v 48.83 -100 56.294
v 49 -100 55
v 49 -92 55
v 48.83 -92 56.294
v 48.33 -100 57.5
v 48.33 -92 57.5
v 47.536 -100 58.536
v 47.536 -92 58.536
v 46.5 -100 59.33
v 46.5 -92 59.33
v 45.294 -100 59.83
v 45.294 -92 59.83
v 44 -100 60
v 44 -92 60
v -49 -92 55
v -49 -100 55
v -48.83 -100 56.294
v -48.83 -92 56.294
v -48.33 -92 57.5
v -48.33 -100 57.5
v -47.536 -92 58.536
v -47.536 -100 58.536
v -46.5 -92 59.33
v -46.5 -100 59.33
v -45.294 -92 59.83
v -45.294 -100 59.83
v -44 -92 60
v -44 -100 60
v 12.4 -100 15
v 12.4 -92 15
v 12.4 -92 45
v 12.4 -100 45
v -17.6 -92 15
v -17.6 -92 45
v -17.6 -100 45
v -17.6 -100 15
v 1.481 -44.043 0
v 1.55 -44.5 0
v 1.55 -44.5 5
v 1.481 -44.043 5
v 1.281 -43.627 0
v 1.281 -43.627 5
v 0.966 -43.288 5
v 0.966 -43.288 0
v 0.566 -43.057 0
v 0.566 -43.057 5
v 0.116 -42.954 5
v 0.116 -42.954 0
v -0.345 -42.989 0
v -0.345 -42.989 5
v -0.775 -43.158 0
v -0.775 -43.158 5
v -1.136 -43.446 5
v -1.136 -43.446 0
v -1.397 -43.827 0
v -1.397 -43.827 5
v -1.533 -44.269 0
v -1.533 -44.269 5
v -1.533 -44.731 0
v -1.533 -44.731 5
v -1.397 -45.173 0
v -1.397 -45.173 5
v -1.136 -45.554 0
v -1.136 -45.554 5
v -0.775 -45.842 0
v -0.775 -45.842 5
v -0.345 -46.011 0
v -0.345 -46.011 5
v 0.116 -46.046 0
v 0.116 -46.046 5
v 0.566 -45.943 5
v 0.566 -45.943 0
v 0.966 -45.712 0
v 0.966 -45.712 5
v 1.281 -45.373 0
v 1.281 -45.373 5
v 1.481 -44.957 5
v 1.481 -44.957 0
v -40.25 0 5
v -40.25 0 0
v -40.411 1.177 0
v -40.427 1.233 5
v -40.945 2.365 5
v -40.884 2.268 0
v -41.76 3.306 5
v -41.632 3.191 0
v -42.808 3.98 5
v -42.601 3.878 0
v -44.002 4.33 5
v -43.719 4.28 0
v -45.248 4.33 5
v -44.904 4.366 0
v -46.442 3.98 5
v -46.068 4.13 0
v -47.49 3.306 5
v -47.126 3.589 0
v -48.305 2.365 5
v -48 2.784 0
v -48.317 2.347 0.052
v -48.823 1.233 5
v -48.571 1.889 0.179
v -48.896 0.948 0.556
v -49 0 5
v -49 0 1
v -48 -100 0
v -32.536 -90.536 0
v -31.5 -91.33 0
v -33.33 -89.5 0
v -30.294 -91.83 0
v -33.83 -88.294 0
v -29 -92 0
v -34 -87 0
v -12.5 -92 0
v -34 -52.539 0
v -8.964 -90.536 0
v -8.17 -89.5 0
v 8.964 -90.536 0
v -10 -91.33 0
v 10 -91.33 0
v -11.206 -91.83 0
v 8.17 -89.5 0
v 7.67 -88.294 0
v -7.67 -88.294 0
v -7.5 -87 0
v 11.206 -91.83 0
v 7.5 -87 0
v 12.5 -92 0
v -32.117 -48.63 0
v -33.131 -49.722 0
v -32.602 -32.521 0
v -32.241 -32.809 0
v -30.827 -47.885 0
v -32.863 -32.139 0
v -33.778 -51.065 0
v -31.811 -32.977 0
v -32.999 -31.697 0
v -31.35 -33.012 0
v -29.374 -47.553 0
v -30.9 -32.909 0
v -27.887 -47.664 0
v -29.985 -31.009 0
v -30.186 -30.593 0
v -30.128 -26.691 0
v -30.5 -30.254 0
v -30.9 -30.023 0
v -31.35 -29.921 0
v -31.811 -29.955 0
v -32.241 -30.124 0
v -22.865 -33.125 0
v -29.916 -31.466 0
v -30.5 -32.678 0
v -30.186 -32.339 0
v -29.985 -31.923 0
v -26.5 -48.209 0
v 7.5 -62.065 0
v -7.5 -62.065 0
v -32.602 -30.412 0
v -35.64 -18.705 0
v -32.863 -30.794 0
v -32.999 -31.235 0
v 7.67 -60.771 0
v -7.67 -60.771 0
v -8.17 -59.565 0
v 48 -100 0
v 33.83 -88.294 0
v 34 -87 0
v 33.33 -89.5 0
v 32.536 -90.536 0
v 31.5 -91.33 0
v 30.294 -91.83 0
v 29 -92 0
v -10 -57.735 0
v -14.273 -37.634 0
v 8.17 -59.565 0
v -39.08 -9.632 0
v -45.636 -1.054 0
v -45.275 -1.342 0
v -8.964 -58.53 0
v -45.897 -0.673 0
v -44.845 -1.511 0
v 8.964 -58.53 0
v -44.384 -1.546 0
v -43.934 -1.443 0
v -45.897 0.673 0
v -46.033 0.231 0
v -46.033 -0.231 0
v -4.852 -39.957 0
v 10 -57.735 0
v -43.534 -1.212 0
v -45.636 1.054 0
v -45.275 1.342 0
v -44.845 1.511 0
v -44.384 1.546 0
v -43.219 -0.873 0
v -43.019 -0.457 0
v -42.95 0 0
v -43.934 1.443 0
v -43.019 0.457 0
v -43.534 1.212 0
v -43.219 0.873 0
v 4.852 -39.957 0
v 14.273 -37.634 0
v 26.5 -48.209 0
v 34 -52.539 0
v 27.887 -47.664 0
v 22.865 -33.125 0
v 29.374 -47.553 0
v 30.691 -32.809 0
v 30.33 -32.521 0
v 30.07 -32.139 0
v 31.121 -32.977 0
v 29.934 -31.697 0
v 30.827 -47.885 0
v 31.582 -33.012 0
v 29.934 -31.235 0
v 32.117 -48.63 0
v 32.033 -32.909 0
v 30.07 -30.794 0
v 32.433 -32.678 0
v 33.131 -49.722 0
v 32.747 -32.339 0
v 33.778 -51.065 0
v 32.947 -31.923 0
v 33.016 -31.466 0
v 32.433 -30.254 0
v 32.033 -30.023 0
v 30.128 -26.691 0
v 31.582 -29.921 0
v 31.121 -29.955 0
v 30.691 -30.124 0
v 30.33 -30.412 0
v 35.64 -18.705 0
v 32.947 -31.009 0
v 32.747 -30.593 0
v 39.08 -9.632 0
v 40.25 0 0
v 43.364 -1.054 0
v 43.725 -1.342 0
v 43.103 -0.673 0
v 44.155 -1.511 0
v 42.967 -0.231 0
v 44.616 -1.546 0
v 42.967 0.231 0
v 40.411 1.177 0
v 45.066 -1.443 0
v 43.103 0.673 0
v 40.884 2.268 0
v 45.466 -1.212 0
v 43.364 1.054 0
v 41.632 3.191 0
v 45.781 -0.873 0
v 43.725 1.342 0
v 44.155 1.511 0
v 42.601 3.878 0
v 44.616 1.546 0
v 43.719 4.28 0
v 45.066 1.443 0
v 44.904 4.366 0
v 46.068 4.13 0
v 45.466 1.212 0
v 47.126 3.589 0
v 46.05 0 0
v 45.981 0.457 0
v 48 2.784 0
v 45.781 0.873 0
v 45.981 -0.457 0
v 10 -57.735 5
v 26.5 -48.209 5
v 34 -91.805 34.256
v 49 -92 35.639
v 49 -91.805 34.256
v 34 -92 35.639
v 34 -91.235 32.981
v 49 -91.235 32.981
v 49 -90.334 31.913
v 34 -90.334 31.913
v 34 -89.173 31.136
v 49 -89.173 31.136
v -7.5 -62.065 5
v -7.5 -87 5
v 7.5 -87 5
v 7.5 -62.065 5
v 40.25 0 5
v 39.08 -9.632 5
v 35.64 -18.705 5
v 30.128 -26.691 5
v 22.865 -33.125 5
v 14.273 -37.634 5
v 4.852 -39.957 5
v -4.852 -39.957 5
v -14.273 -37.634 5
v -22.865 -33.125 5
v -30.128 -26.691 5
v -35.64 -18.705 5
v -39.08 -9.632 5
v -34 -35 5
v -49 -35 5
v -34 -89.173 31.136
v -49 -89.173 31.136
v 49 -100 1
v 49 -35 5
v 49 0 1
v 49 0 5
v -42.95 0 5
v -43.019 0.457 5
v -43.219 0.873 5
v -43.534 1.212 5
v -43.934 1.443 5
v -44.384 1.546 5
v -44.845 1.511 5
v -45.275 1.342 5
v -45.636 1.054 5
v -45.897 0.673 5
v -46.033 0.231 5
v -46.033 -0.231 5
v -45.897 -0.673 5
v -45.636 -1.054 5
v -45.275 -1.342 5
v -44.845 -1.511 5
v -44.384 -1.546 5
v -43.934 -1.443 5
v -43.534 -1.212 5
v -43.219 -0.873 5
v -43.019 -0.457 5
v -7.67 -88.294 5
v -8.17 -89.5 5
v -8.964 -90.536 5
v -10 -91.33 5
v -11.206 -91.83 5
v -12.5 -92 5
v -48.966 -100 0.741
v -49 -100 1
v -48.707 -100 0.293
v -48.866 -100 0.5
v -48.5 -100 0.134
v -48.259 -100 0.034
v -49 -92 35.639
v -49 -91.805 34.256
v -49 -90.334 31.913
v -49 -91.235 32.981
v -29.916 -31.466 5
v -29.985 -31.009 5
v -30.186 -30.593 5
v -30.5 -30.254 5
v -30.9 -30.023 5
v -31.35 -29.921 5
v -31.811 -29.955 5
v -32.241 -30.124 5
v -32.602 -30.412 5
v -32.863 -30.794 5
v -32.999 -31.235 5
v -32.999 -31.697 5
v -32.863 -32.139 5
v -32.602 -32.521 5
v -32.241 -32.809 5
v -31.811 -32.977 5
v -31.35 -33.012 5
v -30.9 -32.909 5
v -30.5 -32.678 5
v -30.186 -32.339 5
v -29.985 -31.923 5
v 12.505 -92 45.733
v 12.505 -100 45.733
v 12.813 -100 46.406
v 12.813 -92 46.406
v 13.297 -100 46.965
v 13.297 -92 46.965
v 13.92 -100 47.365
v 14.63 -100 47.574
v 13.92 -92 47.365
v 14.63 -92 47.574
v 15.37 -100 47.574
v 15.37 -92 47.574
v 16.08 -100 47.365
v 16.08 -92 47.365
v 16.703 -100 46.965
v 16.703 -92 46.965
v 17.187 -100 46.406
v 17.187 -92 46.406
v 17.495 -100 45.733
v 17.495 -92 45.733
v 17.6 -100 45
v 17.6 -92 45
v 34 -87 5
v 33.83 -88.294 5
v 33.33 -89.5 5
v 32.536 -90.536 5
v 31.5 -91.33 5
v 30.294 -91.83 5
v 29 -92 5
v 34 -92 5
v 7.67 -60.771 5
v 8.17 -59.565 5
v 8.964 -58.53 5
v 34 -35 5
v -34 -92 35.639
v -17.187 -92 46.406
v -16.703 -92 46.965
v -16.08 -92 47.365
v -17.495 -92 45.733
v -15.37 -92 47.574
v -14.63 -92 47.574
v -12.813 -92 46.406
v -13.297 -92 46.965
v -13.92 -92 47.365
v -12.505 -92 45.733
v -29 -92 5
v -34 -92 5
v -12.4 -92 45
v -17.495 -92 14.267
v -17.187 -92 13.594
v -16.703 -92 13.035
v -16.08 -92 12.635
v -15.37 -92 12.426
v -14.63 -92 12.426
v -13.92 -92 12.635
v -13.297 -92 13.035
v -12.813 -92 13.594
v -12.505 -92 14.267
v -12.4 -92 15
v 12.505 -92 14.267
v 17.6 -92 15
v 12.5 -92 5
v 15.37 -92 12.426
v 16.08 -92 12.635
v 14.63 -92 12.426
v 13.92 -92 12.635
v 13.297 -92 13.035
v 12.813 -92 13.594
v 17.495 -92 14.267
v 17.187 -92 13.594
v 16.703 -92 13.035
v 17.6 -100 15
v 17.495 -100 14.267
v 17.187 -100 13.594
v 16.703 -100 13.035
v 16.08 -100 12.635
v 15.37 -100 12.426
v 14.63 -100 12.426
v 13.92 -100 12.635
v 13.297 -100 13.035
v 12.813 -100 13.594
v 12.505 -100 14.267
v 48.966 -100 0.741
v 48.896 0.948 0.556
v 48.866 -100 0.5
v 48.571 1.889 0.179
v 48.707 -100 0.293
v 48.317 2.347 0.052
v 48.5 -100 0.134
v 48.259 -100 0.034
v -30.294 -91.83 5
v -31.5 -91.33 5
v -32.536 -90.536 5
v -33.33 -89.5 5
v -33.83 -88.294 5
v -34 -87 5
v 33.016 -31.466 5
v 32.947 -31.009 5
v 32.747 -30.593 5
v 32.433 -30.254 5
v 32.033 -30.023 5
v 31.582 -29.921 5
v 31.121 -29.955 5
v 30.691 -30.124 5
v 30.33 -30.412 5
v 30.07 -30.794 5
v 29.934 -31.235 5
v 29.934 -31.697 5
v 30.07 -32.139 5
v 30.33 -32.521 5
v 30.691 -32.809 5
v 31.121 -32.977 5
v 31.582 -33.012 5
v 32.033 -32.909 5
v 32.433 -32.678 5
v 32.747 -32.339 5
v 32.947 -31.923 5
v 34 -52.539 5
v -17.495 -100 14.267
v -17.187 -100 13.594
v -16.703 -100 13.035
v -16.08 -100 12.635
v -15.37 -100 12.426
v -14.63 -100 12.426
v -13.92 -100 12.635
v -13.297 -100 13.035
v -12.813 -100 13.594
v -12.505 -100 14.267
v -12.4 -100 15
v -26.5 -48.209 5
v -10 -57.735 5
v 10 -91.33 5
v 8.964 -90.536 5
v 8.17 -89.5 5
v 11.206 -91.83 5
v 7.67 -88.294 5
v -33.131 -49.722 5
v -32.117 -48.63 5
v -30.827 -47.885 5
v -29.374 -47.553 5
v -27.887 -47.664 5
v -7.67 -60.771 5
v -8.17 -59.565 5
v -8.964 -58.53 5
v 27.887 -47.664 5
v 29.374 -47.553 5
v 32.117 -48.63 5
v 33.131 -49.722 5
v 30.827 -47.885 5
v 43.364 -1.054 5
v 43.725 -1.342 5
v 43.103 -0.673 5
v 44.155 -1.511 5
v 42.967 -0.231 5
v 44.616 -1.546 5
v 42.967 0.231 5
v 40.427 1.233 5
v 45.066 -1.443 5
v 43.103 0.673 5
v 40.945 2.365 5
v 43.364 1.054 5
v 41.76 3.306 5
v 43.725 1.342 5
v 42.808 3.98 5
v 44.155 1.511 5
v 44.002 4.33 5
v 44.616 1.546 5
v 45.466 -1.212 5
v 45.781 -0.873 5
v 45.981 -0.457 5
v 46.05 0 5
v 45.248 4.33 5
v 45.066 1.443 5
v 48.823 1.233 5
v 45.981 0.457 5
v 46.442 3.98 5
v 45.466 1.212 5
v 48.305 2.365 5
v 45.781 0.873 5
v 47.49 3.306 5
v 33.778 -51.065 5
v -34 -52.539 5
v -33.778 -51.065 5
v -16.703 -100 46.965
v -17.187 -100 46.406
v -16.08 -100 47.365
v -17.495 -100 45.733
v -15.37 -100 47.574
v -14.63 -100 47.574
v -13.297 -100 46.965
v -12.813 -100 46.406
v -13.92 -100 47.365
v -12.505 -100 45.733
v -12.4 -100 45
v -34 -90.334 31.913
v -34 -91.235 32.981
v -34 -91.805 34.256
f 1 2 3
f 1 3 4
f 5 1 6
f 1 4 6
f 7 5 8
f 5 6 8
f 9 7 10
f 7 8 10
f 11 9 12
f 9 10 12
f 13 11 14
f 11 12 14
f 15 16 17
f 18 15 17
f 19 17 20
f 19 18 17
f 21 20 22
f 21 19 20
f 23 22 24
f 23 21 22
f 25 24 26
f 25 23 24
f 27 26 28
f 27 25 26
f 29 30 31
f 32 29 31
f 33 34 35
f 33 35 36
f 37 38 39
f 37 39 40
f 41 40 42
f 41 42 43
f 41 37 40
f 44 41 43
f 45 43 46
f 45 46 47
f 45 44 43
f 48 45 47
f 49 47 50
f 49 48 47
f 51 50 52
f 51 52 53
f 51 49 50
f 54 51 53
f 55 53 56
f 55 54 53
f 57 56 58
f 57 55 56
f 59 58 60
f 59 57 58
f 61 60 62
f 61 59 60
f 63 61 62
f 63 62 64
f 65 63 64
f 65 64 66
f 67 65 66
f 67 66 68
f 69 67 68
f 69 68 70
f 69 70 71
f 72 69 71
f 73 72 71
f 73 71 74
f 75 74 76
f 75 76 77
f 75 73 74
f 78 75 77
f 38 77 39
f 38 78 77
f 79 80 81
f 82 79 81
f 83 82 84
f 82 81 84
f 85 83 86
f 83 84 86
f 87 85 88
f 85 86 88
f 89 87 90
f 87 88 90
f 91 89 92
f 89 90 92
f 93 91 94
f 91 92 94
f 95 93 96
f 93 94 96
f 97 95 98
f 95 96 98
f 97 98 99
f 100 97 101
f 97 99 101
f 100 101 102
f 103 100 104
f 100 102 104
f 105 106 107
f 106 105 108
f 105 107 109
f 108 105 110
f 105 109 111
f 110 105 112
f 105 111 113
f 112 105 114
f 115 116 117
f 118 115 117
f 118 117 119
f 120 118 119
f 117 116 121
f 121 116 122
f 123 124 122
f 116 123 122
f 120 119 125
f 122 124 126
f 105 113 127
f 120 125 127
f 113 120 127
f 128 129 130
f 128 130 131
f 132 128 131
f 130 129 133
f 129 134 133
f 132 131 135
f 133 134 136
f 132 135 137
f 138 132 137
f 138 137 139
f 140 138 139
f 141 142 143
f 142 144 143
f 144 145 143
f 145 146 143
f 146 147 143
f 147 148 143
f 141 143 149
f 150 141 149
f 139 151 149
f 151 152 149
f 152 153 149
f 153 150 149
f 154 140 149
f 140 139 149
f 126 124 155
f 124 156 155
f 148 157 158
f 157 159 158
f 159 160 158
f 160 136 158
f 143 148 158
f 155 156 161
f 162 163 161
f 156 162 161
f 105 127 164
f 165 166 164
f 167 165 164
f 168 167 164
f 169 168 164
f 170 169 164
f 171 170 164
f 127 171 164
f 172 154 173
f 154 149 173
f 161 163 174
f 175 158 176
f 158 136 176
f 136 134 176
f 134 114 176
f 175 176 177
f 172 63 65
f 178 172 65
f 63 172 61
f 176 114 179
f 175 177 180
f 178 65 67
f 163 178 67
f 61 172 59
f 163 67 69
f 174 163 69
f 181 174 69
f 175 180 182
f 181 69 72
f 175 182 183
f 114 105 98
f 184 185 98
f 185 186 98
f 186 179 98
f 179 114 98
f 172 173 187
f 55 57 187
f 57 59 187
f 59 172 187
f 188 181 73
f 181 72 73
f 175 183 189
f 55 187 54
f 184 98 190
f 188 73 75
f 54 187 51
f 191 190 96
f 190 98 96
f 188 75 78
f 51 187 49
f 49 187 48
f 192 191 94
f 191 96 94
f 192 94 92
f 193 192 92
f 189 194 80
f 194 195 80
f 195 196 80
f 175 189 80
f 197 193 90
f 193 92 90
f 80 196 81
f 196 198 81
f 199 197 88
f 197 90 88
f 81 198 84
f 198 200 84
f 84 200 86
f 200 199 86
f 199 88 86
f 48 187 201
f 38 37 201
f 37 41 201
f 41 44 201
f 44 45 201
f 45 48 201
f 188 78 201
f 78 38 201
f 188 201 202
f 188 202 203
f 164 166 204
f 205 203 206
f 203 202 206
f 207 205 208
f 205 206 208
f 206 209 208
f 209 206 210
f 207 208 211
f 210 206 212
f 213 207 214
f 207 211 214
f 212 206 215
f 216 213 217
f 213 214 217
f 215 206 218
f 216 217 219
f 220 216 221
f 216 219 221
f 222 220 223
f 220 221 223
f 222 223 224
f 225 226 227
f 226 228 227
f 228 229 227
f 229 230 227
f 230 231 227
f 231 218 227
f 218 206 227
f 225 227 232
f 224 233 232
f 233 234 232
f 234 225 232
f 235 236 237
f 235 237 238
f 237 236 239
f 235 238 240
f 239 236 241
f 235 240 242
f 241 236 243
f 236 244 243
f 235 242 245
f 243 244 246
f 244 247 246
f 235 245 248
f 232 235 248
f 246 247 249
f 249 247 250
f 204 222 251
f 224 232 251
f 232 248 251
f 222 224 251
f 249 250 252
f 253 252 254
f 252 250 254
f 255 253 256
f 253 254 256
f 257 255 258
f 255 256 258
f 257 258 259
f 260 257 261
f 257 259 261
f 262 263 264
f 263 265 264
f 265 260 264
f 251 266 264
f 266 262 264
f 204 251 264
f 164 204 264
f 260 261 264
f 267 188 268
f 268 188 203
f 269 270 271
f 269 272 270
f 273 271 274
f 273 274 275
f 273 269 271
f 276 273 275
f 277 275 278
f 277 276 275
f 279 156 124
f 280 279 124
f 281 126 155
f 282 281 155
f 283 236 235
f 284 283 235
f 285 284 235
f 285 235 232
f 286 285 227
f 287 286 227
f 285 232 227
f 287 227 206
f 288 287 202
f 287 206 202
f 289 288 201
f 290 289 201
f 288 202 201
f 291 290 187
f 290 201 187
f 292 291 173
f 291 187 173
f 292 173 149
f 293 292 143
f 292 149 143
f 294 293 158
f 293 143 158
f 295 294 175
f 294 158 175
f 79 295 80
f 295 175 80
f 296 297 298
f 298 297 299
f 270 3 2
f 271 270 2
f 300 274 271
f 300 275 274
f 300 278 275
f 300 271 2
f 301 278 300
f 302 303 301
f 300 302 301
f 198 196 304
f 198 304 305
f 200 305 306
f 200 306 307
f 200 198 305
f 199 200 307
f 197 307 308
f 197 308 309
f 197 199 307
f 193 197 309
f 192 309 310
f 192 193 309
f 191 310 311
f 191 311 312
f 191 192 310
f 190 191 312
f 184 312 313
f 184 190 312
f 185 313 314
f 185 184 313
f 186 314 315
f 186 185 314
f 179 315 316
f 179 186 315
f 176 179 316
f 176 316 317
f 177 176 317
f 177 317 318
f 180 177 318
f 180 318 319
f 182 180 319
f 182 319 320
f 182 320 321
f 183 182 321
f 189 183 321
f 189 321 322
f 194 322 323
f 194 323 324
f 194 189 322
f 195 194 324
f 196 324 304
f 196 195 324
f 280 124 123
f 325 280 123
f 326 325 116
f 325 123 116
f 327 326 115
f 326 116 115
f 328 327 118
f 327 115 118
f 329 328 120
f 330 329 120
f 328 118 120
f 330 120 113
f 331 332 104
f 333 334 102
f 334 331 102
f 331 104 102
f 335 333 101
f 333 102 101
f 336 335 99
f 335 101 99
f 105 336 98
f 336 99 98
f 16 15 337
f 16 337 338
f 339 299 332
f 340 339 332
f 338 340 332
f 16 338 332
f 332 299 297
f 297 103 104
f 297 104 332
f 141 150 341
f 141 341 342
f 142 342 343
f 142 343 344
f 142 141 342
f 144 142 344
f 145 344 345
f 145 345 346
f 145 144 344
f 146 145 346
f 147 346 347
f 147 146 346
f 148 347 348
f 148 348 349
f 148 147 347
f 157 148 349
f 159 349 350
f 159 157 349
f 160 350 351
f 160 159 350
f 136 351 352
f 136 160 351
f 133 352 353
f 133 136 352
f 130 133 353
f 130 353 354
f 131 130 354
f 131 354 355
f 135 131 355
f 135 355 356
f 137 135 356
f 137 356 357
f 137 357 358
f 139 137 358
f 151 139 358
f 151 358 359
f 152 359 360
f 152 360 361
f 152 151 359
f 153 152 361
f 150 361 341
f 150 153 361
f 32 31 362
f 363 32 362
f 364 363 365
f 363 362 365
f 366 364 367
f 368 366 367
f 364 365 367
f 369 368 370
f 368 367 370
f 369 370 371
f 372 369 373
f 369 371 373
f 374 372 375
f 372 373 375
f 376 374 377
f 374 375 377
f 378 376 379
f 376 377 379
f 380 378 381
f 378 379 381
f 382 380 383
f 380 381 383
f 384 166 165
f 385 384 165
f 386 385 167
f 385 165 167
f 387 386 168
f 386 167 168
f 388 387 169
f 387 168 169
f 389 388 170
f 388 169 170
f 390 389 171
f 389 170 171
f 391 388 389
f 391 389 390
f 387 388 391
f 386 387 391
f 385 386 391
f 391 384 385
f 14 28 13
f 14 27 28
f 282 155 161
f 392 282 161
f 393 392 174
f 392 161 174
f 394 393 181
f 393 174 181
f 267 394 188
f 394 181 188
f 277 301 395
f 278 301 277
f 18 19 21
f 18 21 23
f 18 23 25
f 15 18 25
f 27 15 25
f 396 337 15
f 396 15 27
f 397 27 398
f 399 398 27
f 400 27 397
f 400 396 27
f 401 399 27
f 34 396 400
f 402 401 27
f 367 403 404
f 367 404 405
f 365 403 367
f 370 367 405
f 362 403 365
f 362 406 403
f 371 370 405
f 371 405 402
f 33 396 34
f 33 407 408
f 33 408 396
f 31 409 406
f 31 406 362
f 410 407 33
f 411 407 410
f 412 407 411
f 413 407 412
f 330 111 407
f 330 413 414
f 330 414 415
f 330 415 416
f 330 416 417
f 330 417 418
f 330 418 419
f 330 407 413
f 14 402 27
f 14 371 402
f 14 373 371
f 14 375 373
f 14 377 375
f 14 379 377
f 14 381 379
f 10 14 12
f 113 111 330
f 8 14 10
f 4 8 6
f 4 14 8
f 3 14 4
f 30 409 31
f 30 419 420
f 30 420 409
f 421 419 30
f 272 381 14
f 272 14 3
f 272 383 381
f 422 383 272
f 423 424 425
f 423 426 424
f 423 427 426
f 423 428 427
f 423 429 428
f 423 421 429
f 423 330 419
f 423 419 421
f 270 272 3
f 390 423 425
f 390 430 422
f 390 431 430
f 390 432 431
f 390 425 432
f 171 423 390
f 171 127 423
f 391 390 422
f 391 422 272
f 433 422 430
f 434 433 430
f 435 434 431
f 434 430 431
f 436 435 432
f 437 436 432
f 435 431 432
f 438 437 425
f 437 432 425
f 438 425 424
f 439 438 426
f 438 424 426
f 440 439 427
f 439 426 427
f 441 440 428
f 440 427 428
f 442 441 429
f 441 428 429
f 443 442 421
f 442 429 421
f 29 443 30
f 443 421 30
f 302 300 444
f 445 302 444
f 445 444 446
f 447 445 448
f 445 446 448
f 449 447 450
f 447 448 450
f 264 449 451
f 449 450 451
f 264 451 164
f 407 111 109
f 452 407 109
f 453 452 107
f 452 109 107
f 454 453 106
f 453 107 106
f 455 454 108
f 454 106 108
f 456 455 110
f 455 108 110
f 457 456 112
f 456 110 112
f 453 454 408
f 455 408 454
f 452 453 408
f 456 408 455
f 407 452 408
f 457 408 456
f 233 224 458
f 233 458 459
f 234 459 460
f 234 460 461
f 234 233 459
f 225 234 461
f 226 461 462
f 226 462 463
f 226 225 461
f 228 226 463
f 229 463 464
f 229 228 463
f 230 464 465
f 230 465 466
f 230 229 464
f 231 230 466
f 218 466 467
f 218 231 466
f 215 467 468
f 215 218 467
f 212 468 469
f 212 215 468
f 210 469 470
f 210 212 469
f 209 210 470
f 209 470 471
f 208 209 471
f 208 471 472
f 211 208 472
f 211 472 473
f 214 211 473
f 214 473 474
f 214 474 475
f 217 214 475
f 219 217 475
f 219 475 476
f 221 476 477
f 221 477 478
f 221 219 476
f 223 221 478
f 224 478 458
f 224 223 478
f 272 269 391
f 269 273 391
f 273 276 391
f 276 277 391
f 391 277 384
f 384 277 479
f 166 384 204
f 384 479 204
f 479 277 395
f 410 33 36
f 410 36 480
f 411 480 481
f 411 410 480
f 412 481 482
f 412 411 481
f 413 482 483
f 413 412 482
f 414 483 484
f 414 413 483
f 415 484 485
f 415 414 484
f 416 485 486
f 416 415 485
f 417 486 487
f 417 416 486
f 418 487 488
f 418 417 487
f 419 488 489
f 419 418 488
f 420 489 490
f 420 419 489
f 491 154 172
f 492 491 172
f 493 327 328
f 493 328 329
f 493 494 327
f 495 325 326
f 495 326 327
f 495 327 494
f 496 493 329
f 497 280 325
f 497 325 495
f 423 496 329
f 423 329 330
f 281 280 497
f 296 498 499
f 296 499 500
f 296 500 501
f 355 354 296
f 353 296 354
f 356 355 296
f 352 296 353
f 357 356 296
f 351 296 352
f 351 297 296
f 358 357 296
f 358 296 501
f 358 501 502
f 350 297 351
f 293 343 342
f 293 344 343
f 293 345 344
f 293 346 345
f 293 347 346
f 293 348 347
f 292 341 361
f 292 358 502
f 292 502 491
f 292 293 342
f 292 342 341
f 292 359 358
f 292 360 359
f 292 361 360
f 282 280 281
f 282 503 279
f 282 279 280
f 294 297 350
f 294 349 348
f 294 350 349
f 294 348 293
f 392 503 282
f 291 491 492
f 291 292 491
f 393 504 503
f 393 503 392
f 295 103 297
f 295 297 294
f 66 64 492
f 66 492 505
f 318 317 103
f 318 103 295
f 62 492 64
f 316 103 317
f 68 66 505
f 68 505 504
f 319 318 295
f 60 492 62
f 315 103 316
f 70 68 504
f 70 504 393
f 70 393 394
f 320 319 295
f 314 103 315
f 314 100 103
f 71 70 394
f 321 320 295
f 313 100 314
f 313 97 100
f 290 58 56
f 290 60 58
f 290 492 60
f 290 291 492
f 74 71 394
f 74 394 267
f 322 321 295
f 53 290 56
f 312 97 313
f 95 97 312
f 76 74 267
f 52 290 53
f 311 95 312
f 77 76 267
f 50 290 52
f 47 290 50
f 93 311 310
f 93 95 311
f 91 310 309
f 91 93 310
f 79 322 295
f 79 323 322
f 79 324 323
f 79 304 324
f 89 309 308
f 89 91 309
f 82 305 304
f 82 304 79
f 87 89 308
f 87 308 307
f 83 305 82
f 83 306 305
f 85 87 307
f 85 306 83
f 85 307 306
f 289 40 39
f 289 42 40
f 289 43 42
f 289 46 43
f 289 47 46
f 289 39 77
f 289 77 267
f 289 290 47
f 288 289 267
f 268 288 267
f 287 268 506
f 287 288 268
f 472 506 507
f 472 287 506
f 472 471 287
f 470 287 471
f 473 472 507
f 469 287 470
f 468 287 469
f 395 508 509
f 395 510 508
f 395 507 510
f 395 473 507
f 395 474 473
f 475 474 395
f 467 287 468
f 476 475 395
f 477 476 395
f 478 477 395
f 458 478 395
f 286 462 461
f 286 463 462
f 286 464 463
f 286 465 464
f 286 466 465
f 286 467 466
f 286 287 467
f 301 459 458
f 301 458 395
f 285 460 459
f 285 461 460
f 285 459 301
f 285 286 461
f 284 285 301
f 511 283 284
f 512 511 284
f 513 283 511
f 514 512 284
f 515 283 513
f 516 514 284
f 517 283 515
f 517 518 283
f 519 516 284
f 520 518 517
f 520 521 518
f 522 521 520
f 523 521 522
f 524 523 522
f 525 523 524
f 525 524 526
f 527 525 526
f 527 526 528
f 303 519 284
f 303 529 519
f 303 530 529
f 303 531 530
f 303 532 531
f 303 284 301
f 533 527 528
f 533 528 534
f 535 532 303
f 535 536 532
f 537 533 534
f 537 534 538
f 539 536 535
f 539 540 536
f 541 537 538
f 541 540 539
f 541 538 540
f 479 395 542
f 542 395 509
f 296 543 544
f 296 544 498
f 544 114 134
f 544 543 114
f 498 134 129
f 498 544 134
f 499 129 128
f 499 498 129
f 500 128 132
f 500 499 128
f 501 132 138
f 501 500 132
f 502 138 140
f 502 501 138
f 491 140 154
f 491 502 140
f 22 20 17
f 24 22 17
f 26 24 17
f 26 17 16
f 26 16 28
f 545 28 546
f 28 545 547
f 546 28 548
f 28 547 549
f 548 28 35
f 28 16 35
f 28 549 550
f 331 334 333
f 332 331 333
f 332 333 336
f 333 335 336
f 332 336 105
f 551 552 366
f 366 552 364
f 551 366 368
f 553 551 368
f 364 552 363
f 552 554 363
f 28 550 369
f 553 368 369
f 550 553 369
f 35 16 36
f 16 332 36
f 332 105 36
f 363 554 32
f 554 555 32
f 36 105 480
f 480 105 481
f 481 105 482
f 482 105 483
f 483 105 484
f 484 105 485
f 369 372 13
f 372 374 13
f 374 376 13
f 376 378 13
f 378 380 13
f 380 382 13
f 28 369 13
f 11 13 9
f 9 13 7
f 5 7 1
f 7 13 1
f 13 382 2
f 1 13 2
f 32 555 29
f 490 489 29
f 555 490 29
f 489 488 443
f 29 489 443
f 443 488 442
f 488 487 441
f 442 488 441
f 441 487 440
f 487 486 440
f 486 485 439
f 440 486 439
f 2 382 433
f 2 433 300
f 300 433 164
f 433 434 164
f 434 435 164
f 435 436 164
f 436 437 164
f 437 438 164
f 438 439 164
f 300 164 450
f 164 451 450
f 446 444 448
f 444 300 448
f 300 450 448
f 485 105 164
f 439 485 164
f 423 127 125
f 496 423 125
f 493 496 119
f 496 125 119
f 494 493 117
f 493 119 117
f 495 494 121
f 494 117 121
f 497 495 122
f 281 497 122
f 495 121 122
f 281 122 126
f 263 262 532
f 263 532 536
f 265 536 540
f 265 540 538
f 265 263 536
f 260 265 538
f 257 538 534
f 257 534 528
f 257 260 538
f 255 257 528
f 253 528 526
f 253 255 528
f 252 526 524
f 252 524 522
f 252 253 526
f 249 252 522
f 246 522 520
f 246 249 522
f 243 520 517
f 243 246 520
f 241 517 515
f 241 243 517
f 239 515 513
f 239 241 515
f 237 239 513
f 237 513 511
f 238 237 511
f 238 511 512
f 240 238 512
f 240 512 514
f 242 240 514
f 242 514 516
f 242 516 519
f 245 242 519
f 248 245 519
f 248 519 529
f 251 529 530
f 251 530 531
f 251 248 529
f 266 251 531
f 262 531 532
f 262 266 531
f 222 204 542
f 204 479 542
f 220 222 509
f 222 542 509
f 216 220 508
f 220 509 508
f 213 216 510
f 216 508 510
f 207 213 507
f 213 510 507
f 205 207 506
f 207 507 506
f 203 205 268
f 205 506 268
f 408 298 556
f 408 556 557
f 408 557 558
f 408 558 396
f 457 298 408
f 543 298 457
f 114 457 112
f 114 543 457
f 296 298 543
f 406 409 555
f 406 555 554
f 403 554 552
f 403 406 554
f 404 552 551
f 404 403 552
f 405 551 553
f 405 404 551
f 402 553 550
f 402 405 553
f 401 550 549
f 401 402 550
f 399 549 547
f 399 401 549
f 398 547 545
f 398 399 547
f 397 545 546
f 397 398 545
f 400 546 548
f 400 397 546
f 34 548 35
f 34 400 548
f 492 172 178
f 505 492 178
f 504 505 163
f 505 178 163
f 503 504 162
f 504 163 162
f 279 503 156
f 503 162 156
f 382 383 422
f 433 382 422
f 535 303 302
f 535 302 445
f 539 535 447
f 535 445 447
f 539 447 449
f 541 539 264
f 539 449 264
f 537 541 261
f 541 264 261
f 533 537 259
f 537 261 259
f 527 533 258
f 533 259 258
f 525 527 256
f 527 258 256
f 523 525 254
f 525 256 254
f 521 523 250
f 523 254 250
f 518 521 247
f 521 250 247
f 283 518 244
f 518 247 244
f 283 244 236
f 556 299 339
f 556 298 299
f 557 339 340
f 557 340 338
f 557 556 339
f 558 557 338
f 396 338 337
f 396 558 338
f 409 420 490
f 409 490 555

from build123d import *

# Parameters (mm, degrees)
SKETCH1_R           = 1.55
BOSS_EXTRUDE1_DEPTH = 5
SKETCH2_W           = 98
SKETCH2_H           = 8
BOSS_EXTRUDE2_DEPTH = 55
BOSS_EXTRUDE3_DEPTH = 15
FILLET2_R           = 5
CUT_EXTRUDE1_DEPTH  = 15
FILLET3_R           = 1


with BuildPart() as part:
    # Sketch1 → Boss-Extrude1 (new body)
    with BuildSketch(Plane.XY):
        with BuildLine():
            Line((-49, 0), (-49, -100))
            Line((-49, -100), (49, -100))
            Line((49, -100), (49, 0))
            ThreePointArc((49, 0), (44.625, 4.375), (40.25, 0))
            ThreePointArc((40.25, 0), (0, -40.25), (-40.25, 0))
            ThreePointArc((-40.25, 0), (-44.625, 4.375), (-49, 0))
        make_face()
        with Locations((0, -44.5)):
            Circle(SKETCH1_R, mode=Mode.SUBTRACT)
        with Locations((-31.466251763, -31.466251763)):
            Circle(SKETCH1_R, mode=Mode.SUBTRACT)
        with Locations((-44.5, 0)):
            Circle(SKETCH1_R, mode=Mode.SUBTRACT)
        with Locations((44.5, 0)):
            Circle(SKETCH1_R, mode=Mode.SUBTRACT)
        with Locations((31.466251763, -31.466251763)):
            Circle(SKETCH1_R, mode=Mode.SUBTRACT)
        with BuildLine():
            Line((-12.5, -92), (-29, -92))
            ThreePointArc((-29, -92), (-32.535533906, -90.535533906), (-34, -87))
            Line((-34, -87), (-34, -43.878620458))
            Line((-34, -43.878620458), (-10, -57.735026919))
            ThreePointArc((-10, -57.735026919), (-8.169872981, -59.565153938), (-7.5, -62.065153938))
            Line((-7.5, -62.065153938), (-7.5, -87))
            ThreePointArc((-7.5, -87), (-8.964466094, -90.535533906), (-12.5, -92))
        make_face(mode=Mode.SUBTRACT)
        with BuildLine():
            Line((10, -57.735026919), (34, -43.878620458))
            Line((34, -43.878620458), (34, -87))
            ThreePointArc((34, -87), (32.535533906, -90.535533906), (29, -92))
            Line((29, -92), (12.5, -92))
            ThreePointArc((12.5, -92), (8.964466094, -90.535533906), (7.5, -87))
            Line((7.5, -87), (7.5, -62.065153938))
            ThreePointArc((7.5, -62.065153938), (8.169872981, -59.565153938), (10, -57.735026919))
        make_face(mode=Mode.SUBTRACT)
    extrude(amount=BOSS_EXTRUDE1_DEPTH)

    # Sketch2 → Boss-Extrude2 (add)
    with BuildSketch(Plane.XY.offset(5)):
        with Locations((0, -96)):
            Rectangle(SKETCH2_W, SKETCH2_H)
    extrude(amount=BOSS_EXTRUDE2_DEPTH)

    # Sketch3 → Boss-Extrude3 (add)
    with BuildSketch(Plane(origin=(49, 0, 0), x_dir=(0, 0, -1), z_dir=(1, 0, 0))):
        Polygon((-5, -35), (-32.5, -92), (-5, -92), align=None)
    boss_extrude3 = extrude(amount=-BOSS_EXTRUDE3_DEPTH)

    # Mirror1: Boss-Extrude3 across plane
    add(boss_extrude3.mirror(Plane(origin=(0, 0, 0), x_dir=(0, 0, 1), z_dir=(1, 0, 0))))

    # Fillet2
    fillet2_edges = [part.edges().sort_by_distance(p)[0] for p in [
        (41.5, -92, 32.5),
        (-41.5, -92, 32.5),
        (-34, -43.878620458, 2.5),
        (34, -43.878620458, 2.5),
        (-49, -96, 60),
        (49, -96, 60),
    ]]
    fillet(fillet2_edges, radius=FILLET2_R)

    # Sketch4 → Cut-Extrude1 (cut)
    with BuildSketch(Plane(origin=(0, -92, 0), x_dir=(1, 0, 0), z_dir=(0, 1, 0))):
        with BuildLine():
            Line((-17.6, -45), (-17.6, -15))
            ThreePointArc((-17.6, -15), (-15, -12.4), (-12.4, -15))
            Line((-12.4, -15), (-12.4, -45))
            ThreePointArc((-12.4, -45), (-15, -47.6), (-17.6, -45))
        make_face()
        with BuildLine():
            Line((17.6, -45), (17.6, -15))
            ThreePointArc((17.6, -15), (15, -12.4), (12.4, -15))
            Line((12.4, -15), (12.4, -45))
            ThreePointArc((12.4, -45), (15, -47.6), (17.6, -45))
        make_face()
    extrude(amount=-CUT_EXTRUDE1_DEPTH, mode=Mode.SUBTRACT)

    # Fillet3
    # the kernel refuses this fillet: 1 mm, written as the material it takes off along each edge
    with BuildSketch(Plane(origin=(49, -106, 0), x_dir=(-1, 0, 0), z_dir=(0, 1, 0))) as fillet3_piece_1:
        with BuildLine():
            CenterArc((FILLET3_R, FILLET3_R), FILLET3_R, 180, 90)
            Line((0, FILLET3_R), (-FILLET3_R * 0.02, FILLET3_R))
            Line((-FILLET3_R * 0.02, FILLET3_R), (-FILLET3_R * 0.02, -FILLET3_R * 0.02))
            Line((-FILLET3_R * 0.02, -FILLET3_R * 0.02), (FILLET3_R, -FILLET3_R * 0.02))
            Line((FILLET3_R, -FILLET3_R * 0.02), (FILLET3_R, 0))
        make_face()
    extrude(amount=112, mode=Mode.SUBTRACT)
    with BuildSketch(Plane(origin=(-49, 6, 0), x_dir=(0, 0, 1), z_dir=(0, -1, 0))) as fillet3_piece_2:
        with BuildLine():
            CenterArc((FILLET3_R, -FILLET3_R), FILLET3_R, 90, 90)
            Line((0, -FILLET3_R), (-FILLET3_R * 0.02, -FILLET3_R))
            Line((-FILLET3_R * 0.02, -FILLET3_R), (-FILLET3_R * 0.02, FILLET3_R * 0.02))
            Line((-FILLET3_R * 0.02, FILLET3_R * 0.02), (FILLET3_R, FILLET3_R * 0.02))
            Line((FILLET3_R, FILLET3_R * 0.02), (FILLET3_R, 0))
        make_face()
    extrude(amount=112, mode=Mode.SUBTRACT)


solid = part.part
